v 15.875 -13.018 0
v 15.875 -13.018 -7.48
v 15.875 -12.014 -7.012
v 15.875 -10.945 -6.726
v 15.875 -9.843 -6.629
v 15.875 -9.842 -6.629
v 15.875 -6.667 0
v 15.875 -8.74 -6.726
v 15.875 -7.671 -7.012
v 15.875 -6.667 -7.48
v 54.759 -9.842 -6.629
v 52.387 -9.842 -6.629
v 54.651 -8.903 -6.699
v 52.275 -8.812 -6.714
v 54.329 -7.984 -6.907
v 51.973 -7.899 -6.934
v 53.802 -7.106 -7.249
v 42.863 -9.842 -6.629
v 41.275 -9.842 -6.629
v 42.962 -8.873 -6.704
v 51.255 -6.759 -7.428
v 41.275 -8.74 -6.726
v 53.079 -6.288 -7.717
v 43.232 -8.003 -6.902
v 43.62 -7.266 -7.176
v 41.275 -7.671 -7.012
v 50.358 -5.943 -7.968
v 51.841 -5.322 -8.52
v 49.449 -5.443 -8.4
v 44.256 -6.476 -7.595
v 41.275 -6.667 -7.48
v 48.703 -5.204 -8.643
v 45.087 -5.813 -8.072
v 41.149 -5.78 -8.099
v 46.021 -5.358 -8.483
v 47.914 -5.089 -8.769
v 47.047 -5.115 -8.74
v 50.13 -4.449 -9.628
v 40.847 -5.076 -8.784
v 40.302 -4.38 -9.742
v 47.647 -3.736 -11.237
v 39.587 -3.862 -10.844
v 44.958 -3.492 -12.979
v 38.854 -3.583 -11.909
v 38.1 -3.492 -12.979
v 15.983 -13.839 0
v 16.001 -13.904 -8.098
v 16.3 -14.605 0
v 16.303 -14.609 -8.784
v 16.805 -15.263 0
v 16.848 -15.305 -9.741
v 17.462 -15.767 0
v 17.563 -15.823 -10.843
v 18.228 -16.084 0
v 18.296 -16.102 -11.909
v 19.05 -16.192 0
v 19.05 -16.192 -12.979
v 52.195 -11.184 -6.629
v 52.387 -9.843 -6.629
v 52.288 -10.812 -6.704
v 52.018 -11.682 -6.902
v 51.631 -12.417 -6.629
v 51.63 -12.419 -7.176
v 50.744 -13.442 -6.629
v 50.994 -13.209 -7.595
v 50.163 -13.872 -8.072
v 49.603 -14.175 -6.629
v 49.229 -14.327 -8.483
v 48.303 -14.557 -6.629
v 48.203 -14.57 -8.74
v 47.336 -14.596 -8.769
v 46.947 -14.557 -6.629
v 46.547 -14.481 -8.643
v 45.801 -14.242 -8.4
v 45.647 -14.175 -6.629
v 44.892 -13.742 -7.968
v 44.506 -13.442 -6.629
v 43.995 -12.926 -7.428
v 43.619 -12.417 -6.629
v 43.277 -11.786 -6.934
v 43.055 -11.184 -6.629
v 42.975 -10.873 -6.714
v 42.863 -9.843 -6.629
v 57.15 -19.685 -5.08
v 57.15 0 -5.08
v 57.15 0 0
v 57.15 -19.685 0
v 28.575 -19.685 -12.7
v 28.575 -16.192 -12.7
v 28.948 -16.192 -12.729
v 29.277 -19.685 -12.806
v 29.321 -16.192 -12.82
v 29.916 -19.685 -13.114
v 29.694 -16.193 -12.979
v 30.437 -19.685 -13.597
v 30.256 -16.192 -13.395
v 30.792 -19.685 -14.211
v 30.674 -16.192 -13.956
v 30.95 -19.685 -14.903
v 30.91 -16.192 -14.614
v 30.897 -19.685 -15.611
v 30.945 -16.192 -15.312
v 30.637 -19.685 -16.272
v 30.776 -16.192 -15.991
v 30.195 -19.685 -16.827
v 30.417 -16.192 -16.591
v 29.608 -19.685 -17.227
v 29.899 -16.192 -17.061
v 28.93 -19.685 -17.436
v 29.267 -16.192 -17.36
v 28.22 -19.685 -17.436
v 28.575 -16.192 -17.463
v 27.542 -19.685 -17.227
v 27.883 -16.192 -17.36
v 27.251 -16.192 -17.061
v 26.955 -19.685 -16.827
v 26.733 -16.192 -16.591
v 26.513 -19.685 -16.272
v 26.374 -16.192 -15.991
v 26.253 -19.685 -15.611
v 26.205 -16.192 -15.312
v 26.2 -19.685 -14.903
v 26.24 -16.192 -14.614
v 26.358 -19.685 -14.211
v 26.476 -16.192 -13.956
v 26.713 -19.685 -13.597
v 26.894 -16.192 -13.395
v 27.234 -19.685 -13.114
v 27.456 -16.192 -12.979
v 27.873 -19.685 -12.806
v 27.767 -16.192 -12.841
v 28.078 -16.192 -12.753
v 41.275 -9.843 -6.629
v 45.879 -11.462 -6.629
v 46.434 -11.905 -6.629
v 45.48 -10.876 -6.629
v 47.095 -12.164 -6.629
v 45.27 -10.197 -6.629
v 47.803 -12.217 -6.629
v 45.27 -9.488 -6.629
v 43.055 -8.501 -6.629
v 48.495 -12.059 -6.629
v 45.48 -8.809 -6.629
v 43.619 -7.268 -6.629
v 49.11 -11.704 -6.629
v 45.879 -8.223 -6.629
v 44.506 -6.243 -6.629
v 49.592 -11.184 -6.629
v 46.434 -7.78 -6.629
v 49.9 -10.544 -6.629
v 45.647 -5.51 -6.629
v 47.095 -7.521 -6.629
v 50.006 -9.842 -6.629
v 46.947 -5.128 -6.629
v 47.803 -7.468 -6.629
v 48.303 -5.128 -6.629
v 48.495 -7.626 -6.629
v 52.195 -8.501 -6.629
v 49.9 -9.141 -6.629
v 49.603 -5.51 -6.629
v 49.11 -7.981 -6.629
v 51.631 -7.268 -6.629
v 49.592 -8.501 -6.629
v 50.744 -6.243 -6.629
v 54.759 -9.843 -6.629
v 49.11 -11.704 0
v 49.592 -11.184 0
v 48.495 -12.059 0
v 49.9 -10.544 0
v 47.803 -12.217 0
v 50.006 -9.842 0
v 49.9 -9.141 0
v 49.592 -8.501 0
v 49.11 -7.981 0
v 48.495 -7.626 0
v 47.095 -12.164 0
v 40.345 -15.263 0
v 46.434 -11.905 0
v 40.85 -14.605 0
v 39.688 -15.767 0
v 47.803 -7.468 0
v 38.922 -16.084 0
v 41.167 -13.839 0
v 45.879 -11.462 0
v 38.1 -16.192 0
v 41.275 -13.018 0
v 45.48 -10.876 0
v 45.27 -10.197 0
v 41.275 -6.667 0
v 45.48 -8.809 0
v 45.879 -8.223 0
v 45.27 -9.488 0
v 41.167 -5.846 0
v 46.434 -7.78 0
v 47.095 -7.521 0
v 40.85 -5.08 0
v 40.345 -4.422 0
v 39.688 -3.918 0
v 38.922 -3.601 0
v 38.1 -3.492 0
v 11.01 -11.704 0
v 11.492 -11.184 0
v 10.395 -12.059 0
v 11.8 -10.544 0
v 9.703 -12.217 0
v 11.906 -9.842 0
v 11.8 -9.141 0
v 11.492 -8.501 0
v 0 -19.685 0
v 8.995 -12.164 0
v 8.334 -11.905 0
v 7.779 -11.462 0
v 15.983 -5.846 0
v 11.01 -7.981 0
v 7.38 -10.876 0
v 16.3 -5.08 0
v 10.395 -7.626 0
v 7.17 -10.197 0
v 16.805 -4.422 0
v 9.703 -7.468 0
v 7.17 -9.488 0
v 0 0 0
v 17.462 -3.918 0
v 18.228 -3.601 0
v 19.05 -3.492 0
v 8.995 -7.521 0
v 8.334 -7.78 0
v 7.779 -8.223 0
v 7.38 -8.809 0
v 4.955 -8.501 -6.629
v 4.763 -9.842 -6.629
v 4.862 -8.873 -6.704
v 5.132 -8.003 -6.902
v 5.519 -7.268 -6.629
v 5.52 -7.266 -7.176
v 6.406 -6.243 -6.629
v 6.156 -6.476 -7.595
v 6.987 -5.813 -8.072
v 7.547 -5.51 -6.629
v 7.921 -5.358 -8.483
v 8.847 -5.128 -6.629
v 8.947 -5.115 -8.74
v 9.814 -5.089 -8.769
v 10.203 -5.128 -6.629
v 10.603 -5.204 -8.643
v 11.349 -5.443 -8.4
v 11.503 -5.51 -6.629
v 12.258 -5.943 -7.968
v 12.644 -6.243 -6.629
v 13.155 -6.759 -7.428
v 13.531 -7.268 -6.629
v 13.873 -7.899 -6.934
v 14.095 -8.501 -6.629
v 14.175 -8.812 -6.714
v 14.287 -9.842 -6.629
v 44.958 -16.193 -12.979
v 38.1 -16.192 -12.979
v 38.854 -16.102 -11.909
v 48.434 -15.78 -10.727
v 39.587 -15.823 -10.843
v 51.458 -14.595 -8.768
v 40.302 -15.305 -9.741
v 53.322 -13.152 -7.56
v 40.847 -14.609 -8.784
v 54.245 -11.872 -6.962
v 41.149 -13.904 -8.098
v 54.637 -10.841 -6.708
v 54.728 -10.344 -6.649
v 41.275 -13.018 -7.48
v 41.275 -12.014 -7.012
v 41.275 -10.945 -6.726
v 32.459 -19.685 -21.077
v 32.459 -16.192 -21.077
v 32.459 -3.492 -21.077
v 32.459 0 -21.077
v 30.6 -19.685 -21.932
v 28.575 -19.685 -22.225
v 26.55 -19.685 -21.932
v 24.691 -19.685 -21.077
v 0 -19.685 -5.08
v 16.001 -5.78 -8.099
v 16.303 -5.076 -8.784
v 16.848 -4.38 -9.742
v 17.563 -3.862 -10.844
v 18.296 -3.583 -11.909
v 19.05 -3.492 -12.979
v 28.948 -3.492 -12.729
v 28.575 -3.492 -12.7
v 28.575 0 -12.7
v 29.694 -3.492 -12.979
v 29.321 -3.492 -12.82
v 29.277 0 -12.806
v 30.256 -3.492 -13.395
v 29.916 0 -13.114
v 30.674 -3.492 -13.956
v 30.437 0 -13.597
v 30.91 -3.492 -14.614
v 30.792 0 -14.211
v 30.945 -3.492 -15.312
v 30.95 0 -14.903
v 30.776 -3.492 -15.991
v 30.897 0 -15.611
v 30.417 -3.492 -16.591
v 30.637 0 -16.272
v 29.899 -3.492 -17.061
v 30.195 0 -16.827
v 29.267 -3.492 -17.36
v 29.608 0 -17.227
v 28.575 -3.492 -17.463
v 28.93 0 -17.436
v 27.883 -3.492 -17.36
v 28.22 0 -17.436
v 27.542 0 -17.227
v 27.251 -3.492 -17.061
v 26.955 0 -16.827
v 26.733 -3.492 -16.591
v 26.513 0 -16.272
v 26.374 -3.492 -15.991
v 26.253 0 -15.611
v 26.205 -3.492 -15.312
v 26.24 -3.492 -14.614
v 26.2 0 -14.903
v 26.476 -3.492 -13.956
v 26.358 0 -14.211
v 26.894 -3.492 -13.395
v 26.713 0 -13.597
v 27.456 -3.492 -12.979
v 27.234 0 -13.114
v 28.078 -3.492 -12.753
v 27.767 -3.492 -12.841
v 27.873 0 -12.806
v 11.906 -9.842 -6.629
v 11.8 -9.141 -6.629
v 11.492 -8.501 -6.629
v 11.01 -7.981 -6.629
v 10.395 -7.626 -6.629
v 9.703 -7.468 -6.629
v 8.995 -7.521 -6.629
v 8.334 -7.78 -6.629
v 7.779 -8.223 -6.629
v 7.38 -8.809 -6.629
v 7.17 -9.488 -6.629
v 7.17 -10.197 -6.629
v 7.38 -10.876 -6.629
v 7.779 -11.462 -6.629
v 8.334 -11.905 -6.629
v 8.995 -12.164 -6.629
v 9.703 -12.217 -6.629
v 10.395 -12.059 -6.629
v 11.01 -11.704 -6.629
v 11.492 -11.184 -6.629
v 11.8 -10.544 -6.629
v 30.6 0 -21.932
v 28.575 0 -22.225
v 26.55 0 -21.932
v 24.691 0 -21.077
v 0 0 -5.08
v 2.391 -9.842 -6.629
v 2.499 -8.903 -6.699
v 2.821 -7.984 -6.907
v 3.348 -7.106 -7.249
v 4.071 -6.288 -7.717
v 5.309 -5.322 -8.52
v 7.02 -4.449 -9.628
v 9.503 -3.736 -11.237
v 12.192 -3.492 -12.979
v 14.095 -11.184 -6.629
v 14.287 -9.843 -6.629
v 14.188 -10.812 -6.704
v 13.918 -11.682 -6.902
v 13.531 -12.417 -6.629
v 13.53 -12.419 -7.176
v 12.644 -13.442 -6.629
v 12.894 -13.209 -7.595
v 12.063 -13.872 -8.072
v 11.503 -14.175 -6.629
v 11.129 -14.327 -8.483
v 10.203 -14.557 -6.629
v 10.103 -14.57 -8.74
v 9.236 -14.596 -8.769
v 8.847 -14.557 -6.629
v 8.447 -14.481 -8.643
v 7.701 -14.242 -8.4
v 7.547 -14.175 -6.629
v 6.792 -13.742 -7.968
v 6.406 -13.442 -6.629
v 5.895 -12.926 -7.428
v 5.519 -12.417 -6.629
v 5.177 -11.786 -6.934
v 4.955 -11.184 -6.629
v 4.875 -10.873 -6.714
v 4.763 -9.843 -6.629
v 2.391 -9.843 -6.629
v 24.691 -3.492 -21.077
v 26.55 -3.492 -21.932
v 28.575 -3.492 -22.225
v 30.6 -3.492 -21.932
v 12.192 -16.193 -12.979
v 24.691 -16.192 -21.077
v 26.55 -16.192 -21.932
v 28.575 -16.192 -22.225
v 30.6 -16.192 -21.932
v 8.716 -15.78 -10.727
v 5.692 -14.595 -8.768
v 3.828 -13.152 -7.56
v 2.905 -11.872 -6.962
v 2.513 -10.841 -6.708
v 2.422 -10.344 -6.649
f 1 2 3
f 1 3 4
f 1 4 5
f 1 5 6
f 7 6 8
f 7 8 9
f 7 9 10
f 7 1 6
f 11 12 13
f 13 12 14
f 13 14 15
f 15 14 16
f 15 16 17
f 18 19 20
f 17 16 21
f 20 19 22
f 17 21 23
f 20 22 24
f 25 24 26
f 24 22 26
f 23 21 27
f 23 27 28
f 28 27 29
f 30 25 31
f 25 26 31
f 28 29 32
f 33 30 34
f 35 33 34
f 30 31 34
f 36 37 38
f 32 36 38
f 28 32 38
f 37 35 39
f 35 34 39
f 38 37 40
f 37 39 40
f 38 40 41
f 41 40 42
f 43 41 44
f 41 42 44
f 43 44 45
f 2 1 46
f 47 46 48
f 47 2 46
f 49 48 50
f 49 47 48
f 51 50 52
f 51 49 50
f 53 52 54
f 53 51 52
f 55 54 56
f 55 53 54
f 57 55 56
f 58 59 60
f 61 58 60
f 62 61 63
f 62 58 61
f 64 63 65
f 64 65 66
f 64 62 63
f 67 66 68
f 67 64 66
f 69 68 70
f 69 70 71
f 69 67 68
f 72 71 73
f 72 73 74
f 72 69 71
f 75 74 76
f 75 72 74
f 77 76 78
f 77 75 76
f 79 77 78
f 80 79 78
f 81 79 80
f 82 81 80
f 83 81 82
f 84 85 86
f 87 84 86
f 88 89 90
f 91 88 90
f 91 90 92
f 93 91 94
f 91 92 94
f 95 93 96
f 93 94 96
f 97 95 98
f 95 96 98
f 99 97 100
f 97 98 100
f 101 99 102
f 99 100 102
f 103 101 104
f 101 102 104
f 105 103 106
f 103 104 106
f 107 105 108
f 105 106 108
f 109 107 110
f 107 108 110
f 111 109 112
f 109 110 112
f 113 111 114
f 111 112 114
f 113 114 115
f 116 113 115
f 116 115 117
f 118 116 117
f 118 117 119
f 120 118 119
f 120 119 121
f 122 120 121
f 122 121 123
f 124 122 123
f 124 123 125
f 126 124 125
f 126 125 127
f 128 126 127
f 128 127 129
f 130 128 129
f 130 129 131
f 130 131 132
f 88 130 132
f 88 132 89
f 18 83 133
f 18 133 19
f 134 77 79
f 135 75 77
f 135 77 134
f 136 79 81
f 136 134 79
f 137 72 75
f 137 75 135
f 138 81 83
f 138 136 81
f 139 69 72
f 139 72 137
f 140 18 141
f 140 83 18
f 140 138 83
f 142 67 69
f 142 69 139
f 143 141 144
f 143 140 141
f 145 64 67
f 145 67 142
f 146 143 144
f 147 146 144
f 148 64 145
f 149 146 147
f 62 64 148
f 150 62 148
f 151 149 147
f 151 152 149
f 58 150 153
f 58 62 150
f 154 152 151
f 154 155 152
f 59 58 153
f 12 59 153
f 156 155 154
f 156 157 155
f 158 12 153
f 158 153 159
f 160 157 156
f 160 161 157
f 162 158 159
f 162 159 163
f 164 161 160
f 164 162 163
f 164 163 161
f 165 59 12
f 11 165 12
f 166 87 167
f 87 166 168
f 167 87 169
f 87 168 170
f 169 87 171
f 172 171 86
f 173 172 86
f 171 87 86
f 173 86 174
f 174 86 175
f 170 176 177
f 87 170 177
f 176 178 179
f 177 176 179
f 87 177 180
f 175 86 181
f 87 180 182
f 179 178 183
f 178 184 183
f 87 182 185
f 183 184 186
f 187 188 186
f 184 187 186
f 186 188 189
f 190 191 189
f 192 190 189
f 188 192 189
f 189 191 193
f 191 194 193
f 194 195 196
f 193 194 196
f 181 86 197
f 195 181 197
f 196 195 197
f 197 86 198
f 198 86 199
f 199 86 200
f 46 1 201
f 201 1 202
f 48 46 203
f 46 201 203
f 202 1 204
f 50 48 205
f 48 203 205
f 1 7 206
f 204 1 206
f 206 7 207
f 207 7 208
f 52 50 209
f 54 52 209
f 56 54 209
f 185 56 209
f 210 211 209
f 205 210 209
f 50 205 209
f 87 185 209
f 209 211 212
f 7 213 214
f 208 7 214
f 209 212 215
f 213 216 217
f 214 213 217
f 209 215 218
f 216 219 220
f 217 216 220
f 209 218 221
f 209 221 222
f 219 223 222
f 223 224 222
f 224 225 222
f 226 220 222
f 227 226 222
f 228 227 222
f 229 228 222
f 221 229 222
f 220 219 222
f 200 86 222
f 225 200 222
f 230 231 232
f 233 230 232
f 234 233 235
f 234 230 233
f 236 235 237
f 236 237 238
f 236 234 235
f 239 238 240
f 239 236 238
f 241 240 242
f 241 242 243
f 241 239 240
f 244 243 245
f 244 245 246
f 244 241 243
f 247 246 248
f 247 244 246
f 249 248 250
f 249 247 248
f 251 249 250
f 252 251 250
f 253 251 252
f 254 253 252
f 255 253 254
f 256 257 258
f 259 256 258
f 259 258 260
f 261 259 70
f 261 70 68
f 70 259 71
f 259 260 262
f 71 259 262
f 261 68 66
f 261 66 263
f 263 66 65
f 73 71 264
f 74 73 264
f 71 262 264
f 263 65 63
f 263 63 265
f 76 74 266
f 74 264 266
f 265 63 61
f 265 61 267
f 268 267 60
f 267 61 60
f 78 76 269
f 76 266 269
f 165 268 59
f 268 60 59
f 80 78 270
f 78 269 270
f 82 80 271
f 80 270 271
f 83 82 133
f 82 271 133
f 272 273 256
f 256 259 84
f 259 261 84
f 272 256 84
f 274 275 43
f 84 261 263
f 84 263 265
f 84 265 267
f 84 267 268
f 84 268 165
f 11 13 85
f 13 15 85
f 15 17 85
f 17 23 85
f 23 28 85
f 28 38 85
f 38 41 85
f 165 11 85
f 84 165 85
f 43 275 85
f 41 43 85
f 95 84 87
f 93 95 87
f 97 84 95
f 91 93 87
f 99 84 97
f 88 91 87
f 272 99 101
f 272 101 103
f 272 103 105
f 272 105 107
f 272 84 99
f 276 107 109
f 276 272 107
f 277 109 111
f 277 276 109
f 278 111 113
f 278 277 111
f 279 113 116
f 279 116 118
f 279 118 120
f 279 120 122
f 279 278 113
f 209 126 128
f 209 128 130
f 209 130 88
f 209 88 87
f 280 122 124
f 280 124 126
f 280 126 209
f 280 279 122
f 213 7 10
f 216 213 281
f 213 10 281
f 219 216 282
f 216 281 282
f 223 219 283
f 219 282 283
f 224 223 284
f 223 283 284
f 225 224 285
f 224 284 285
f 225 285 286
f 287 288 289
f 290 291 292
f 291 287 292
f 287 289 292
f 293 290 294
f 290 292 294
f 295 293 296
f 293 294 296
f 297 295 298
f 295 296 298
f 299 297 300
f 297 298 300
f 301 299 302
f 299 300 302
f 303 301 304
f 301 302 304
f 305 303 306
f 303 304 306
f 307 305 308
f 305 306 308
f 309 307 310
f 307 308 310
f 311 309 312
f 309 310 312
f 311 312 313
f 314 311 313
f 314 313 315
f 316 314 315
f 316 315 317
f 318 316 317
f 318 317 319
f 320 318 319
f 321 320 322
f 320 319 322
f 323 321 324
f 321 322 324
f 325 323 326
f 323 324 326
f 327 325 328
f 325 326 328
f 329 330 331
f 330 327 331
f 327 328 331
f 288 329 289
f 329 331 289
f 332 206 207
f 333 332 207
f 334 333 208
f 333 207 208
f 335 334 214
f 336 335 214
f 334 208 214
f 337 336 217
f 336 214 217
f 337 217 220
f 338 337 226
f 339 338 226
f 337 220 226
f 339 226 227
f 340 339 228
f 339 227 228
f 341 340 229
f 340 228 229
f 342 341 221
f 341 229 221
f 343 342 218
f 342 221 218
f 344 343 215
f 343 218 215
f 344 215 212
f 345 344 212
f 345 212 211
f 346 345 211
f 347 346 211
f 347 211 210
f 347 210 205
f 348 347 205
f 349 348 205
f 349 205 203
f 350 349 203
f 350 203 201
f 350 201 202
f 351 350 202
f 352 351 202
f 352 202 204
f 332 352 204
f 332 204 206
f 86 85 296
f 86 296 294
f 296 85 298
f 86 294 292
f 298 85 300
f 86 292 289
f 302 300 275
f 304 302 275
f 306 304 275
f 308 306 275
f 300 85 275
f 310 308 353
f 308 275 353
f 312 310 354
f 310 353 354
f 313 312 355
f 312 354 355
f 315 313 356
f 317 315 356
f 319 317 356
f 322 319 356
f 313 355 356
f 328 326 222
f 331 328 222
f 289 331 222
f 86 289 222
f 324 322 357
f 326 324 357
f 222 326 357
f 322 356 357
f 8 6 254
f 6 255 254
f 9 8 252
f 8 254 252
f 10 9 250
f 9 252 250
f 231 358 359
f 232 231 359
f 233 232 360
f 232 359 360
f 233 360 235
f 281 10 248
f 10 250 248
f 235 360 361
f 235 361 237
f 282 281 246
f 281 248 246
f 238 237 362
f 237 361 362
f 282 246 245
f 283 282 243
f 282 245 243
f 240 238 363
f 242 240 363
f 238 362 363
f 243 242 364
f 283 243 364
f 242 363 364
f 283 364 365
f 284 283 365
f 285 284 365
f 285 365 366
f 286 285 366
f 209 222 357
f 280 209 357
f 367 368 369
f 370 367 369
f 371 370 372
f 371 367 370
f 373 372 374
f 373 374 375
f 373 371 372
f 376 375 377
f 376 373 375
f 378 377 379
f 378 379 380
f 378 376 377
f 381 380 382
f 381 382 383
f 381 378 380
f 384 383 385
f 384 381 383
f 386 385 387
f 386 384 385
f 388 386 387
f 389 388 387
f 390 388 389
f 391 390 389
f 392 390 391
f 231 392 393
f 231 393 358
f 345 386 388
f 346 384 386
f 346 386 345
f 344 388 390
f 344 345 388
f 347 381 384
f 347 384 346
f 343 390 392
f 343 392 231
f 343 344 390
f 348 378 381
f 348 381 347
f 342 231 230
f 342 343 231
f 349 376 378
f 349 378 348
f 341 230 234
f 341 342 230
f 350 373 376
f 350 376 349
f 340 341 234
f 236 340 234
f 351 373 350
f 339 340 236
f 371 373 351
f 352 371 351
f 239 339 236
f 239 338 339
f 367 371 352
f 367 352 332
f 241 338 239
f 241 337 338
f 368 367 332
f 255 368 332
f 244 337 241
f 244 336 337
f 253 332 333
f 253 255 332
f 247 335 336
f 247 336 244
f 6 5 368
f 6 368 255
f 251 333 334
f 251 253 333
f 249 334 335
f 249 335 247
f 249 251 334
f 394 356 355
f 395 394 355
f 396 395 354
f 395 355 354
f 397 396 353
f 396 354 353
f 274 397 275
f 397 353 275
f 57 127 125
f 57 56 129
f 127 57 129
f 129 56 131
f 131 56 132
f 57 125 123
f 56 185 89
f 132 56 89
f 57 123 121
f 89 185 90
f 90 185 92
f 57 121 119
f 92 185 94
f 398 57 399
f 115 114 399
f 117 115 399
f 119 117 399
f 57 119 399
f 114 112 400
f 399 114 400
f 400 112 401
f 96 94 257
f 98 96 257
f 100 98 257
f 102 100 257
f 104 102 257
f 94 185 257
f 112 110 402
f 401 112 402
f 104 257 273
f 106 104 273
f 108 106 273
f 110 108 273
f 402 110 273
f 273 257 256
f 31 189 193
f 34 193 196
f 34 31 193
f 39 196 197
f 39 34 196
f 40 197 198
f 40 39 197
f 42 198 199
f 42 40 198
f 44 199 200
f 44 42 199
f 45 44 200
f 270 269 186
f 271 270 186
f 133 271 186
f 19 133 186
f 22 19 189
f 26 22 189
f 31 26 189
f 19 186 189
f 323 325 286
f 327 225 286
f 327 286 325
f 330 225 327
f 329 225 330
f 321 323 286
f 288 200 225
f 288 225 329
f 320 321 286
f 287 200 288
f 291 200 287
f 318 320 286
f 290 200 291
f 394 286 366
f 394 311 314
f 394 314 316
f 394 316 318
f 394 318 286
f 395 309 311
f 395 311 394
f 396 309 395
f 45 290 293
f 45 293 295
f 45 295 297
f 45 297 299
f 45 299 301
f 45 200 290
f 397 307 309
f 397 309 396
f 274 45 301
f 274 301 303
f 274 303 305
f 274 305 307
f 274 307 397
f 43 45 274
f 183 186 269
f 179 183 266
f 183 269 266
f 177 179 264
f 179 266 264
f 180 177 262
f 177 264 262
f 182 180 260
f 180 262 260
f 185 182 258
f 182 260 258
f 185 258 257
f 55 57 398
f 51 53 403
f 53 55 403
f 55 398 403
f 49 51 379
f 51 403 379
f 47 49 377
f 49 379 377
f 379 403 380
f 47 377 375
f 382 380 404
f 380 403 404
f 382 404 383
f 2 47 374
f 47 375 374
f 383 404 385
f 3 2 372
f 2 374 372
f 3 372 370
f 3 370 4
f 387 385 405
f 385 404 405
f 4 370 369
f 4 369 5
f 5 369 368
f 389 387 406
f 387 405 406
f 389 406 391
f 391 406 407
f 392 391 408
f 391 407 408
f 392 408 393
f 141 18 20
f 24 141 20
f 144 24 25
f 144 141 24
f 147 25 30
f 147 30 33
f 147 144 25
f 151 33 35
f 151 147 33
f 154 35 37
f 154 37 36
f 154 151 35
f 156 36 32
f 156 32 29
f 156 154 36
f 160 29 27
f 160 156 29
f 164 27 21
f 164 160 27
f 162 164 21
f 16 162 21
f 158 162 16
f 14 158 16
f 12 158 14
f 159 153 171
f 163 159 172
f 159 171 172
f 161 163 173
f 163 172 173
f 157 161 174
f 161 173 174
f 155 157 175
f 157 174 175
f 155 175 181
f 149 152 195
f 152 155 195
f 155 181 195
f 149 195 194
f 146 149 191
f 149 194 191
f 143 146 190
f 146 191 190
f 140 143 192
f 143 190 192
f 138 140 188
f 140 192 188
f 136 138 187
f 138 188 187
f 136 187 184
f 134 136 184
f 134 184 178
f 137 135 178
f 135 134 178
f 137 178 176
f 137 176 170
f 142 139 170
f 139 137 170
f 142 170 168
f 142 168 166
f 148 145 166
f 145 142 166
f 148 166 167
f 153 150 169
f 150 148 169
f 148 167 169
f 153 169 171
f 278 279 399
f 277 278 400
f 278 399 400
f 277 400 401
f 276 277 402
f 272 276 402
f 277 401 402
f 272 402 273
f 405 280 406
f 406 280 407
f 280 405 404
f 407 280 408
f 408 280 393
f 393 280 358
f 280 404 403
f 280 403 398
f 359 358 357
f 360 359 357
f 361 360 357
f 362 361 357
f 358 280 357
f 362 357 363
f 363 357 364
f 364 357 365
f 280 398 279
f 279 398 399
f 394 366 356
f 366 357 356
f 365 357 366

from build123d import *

# Parameters (mm, degrees)
SKETCH1_R              = 2.38125
BOSS_EXTRUDE1_DEPTH    = 19.685
SKETCH2_W              = 15.5956
SKETCH2_H              = 12.7
CUT_EXTRUDE1_DEPTH     = 65.401648659
FILLET1_R              = 6.35
SKETCH3_R              = 2.38125
SKETCH3_W              = 25.4
SKETCH3_H              = 12.7
CUT_EXTRUDE2_DEPTH     = 65.40164869
FILLET2_R              = 3.175
CUT_EXTRUDE5_OUTLINE_R = 4.7625
CUT_EXTRUDE5_DEPTH     = 2.149867926


with BuildPart() as part:
    # Sketch1 → Boss-Extrude1 (new body)
    with BuildSketch(Plane(origin=(0, 0, 0), x_dir=(1, 0, 0), z_dir=(0, 1, 0))):
        with BuildLine():
            Line((0, 5.08), (24.690664344, 21.076673302))
            ThreePointArc((24.690664344, 21.076673302), (28.575, 22.225), (32.459335656, 21.076673302))
            Line((32.459335656, 21.076673302), (57.15, 5.08))
            Line((57.15, 5.08), (57.15, 0))
            Line((57.15, 0), (0, 0))
            Line((0, 0), (0, 5.08))
        make_face()
        with Locations(Location((28.575, 15.08125, 0), (0, 0, 270))):
            Circle(SKETCH1_R, mode=Mode.SUBTRACT)
    extrude(amount=-BOSS_EXTRUDE1_DEPTH)

    # Sketch2 → Cut-Extrude1 (cut, through all)
    with BuildSketch(Plane(origin=(57.15, 0, 0), x_dir=(0, 0, -1), z_dir=(1, 0, 0))):
        with Locations((14.4272, -9.8425)):
            Rectangle(SKETCH2_W, SKETCH2_H)
    extrude(amount=-CUT_EXTRUDE1_DEPTH, mode=Mode.SUBTRACT)

    # Fillet1
    fillet1_edges = [part.edges().sort_by_distance(p)[0] for p in [
        (28.575, -16.1925, -6.6294),
        (28.575, -3.4925, -6.6294),
    ]]
    fillet(fillet1_edges, radius=FILLET1_R - 0.0001)  # a hair under: the kernel refuses the full size

    # Sketch3 → Cut-Extrude2 (cut, through all)
    with BuildSketch(Plane.XY):
        with Locations((9.525, -9.8425)):
            Circle(SKETCH3_R)
        with Locations((47.625, -9.8425)):
            Circle(SKETCH3_R)
        with Locations((28.575, -9.8425)):
            Rectangle(SKETCH3_W, SKETCH3_H)
    extrude(amount=-CUT_EXTRUDE2_DEPTH, mode=Mode.SUBTRACT)

    # Fillet2
    fillet2_edges = [part.edges().sort_by_distance(p)[0] for p in [
        (41.275, -3.4925, -6.48965),
        (15.875, -16.1925, -6.48965),
        (41.275, -16.1925, -6.48965),
        (15.875, -3.4925, -6.48965),
    ]]
    fillet(fillet2_edges, radius=FILLET2_R)

    # Cut-Extrude5: read off the stored shape, not the designer's step
    # Cut-Extrude5 outline → Cut-Extrude5 (cut)
    with BuildSketch(Plane(origin=(0, 0, -6.6294), x_dir=(-1, 0, 0), z_dir=(0, 0, -1))):
        with Locations((-47.625, -9.8425)):
            Circle(CUT_EXTRUDE5_OUTLINE_R)
        with Locations((-9.525, -9.8425)):
            Circle(CUT_EXTRUDE5_OUTLINE_R)
    extrude(amount=CUT_EXTRUDE5_DEPTH, mode=Mode.SUBTRACT)


solid = part.part
